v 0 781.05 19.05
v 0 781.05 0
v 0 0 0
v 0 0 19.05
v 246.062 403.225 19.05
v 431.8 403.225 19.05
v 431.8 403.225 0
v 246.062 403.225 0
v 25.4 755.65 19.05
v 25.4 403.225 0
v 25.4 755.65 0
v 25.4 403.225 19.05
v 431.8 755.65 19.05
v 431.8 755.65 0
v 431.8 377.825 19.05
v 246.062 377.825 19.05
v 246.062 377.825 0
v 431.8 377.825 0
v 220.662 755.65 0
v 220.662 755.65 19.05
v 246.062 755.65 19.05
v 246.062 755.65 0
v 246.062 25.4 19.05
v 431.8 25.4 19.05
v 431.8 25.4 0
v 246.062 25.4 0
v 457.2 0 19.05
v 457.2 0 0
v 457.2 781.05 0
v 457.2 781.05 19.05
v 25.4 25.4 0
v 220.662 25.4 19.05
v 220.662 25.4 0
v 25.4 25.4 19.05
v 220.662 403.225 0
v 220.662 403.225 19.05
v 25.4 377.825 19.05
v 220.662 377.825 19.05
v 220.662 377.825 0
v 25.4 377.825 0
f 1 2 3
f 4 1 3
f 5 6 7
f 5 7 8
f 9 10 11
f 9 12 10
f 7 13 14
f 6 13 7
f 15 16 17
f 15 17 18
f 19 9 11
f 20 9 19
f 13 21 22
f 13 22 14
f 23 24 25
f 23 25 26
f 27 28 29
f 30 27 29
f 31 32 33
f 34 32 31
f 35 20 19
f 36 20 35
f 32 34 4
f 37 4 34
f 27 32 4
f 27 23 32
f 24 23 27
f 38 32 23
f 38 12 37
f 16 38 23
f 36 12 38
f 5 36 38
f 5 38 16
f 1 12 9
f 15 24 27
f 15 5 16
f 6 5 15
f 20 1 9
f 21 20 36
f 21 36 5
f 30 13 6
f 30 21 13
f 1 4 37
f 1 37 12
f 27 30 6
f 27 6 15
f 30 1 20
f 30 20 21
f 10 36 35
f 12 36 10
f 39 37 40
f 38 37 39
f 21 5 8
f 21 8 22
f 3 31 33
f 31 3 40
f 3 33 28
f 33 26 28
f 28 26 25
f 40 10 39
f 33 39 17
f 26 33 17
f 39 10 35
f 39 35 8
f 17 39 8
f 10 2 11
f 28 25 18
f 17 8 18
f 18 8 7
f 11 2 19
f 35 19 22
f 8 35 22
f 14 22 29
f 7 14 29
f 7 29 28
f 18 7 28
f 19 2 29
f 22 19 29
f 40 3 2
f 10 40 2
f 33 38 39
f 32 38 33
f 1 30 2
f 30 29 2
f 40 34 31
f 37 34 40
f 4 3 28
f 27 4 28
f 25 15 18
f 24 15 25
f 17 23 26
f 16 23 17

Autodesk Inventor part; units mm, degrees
ref_plane "YZ Plane" through (0, 0, 0) normal (1, 0, 0) x (0, 1, 0)
ref_plane "XZ Plane" through (0, 0, 0) normal (0, 1, 0) x (-1, 0, 0)
ref_plane "XY Plane" through (0, 0, 0) normal (0, 0, 1) x (1, 0, 0)
sketch "Sketch1" plane through (0, 0, 0) normal (0, 0, 1) x (1, 0, 0)
  line L0 (0, 0) -> (457.2, 0)
  line L1 (457.2, 0) -> (457.2, 781.05)
  line L2 (457.2, 781.05) -> (0, 781.05)
  line L3 (0, 781.05) -> (0, 0)
  dimension "d0" = 457.2
  dimension "d1" = 781.05
extrude "Extrusion1" add sketch "Sketch1" along normal blind 19.05
sketch "Sketch2" plane through (0, 0, 19.05) normal (0, 0, 1) x (1, 0, 0)
  line L0 (0, 0) -> (457.2, 0) projected
  line L1 (457.2, 0) -> (457.2, 781.05) projected
  line L2 (457.2, 781.05) -> (0, 781.05) projected
  line L3 (0, 781.05) -> (0, 0) projected
  line L4 (25.4, 755.65) -> (220.6625, 755.65)
  line L5 (220.6625, 755.65) -> (220.6625, 403.225)
  line L6 (220.6625, 403.225) -> (25.4, 403.225)
  line L7 (25.4, 403.225) -> (25.4, 755.65)
  line L8 (246.0625, 755.65) -> (431.8, 755.65)
  line L9 (431.8, 755.65) -> (431.8, 403.225)
  line L10 (431.8, 403.225) -> (246.0625, 403.225)
  line L11 (246.0625, 403.225) -> (246.0625, 755.65)
  line L12 (25.4, 377.825) -> (220.6625, 377.825)
  line L13 (220.6625, 377.825) -> (220.6625, 25.4)
  line L14 (220.6625, 25.4) -> (25.4, 25.4)
  line L15 (25.4, 25.4) -> (25.4, 377.825)
  line L16 (246.0625, 377.825) -> (431.8, 377.825)
  line L17 (431.8, 377.825) -> (431.8, 25.4)
  line L18 (431.8, 25.4) -> (246.0625, 25.4)
  line L19 (246.0625, 25.4) -> (246.0625, 377.825)
  dimension "d24" = 25.4
  dimension "d25" = 25.4
  dimension "d26" = 25.4
  dimension "d27" = 25.4
  dimension "d28" = 25.4
  dimension "d29" = 25.4
  dimension "d30" = 25.4
  dimension "d31" = 25.4
  dimension "d32" = 25.4
  dimension "d33" = 25.4
  dimension "d34" = 185.7375
  dimension "d35" = 195.2625
  dimension "d36" = 352.425
extrude "Extrusion2" cut sketch "Sketch2" against normal blind 19.05 contours L4 L5 L6 L7 | L8 L9 L10 L11 | L12 L13 L14 L15 | L16 L17 L18 L19
properties part number "Door"
